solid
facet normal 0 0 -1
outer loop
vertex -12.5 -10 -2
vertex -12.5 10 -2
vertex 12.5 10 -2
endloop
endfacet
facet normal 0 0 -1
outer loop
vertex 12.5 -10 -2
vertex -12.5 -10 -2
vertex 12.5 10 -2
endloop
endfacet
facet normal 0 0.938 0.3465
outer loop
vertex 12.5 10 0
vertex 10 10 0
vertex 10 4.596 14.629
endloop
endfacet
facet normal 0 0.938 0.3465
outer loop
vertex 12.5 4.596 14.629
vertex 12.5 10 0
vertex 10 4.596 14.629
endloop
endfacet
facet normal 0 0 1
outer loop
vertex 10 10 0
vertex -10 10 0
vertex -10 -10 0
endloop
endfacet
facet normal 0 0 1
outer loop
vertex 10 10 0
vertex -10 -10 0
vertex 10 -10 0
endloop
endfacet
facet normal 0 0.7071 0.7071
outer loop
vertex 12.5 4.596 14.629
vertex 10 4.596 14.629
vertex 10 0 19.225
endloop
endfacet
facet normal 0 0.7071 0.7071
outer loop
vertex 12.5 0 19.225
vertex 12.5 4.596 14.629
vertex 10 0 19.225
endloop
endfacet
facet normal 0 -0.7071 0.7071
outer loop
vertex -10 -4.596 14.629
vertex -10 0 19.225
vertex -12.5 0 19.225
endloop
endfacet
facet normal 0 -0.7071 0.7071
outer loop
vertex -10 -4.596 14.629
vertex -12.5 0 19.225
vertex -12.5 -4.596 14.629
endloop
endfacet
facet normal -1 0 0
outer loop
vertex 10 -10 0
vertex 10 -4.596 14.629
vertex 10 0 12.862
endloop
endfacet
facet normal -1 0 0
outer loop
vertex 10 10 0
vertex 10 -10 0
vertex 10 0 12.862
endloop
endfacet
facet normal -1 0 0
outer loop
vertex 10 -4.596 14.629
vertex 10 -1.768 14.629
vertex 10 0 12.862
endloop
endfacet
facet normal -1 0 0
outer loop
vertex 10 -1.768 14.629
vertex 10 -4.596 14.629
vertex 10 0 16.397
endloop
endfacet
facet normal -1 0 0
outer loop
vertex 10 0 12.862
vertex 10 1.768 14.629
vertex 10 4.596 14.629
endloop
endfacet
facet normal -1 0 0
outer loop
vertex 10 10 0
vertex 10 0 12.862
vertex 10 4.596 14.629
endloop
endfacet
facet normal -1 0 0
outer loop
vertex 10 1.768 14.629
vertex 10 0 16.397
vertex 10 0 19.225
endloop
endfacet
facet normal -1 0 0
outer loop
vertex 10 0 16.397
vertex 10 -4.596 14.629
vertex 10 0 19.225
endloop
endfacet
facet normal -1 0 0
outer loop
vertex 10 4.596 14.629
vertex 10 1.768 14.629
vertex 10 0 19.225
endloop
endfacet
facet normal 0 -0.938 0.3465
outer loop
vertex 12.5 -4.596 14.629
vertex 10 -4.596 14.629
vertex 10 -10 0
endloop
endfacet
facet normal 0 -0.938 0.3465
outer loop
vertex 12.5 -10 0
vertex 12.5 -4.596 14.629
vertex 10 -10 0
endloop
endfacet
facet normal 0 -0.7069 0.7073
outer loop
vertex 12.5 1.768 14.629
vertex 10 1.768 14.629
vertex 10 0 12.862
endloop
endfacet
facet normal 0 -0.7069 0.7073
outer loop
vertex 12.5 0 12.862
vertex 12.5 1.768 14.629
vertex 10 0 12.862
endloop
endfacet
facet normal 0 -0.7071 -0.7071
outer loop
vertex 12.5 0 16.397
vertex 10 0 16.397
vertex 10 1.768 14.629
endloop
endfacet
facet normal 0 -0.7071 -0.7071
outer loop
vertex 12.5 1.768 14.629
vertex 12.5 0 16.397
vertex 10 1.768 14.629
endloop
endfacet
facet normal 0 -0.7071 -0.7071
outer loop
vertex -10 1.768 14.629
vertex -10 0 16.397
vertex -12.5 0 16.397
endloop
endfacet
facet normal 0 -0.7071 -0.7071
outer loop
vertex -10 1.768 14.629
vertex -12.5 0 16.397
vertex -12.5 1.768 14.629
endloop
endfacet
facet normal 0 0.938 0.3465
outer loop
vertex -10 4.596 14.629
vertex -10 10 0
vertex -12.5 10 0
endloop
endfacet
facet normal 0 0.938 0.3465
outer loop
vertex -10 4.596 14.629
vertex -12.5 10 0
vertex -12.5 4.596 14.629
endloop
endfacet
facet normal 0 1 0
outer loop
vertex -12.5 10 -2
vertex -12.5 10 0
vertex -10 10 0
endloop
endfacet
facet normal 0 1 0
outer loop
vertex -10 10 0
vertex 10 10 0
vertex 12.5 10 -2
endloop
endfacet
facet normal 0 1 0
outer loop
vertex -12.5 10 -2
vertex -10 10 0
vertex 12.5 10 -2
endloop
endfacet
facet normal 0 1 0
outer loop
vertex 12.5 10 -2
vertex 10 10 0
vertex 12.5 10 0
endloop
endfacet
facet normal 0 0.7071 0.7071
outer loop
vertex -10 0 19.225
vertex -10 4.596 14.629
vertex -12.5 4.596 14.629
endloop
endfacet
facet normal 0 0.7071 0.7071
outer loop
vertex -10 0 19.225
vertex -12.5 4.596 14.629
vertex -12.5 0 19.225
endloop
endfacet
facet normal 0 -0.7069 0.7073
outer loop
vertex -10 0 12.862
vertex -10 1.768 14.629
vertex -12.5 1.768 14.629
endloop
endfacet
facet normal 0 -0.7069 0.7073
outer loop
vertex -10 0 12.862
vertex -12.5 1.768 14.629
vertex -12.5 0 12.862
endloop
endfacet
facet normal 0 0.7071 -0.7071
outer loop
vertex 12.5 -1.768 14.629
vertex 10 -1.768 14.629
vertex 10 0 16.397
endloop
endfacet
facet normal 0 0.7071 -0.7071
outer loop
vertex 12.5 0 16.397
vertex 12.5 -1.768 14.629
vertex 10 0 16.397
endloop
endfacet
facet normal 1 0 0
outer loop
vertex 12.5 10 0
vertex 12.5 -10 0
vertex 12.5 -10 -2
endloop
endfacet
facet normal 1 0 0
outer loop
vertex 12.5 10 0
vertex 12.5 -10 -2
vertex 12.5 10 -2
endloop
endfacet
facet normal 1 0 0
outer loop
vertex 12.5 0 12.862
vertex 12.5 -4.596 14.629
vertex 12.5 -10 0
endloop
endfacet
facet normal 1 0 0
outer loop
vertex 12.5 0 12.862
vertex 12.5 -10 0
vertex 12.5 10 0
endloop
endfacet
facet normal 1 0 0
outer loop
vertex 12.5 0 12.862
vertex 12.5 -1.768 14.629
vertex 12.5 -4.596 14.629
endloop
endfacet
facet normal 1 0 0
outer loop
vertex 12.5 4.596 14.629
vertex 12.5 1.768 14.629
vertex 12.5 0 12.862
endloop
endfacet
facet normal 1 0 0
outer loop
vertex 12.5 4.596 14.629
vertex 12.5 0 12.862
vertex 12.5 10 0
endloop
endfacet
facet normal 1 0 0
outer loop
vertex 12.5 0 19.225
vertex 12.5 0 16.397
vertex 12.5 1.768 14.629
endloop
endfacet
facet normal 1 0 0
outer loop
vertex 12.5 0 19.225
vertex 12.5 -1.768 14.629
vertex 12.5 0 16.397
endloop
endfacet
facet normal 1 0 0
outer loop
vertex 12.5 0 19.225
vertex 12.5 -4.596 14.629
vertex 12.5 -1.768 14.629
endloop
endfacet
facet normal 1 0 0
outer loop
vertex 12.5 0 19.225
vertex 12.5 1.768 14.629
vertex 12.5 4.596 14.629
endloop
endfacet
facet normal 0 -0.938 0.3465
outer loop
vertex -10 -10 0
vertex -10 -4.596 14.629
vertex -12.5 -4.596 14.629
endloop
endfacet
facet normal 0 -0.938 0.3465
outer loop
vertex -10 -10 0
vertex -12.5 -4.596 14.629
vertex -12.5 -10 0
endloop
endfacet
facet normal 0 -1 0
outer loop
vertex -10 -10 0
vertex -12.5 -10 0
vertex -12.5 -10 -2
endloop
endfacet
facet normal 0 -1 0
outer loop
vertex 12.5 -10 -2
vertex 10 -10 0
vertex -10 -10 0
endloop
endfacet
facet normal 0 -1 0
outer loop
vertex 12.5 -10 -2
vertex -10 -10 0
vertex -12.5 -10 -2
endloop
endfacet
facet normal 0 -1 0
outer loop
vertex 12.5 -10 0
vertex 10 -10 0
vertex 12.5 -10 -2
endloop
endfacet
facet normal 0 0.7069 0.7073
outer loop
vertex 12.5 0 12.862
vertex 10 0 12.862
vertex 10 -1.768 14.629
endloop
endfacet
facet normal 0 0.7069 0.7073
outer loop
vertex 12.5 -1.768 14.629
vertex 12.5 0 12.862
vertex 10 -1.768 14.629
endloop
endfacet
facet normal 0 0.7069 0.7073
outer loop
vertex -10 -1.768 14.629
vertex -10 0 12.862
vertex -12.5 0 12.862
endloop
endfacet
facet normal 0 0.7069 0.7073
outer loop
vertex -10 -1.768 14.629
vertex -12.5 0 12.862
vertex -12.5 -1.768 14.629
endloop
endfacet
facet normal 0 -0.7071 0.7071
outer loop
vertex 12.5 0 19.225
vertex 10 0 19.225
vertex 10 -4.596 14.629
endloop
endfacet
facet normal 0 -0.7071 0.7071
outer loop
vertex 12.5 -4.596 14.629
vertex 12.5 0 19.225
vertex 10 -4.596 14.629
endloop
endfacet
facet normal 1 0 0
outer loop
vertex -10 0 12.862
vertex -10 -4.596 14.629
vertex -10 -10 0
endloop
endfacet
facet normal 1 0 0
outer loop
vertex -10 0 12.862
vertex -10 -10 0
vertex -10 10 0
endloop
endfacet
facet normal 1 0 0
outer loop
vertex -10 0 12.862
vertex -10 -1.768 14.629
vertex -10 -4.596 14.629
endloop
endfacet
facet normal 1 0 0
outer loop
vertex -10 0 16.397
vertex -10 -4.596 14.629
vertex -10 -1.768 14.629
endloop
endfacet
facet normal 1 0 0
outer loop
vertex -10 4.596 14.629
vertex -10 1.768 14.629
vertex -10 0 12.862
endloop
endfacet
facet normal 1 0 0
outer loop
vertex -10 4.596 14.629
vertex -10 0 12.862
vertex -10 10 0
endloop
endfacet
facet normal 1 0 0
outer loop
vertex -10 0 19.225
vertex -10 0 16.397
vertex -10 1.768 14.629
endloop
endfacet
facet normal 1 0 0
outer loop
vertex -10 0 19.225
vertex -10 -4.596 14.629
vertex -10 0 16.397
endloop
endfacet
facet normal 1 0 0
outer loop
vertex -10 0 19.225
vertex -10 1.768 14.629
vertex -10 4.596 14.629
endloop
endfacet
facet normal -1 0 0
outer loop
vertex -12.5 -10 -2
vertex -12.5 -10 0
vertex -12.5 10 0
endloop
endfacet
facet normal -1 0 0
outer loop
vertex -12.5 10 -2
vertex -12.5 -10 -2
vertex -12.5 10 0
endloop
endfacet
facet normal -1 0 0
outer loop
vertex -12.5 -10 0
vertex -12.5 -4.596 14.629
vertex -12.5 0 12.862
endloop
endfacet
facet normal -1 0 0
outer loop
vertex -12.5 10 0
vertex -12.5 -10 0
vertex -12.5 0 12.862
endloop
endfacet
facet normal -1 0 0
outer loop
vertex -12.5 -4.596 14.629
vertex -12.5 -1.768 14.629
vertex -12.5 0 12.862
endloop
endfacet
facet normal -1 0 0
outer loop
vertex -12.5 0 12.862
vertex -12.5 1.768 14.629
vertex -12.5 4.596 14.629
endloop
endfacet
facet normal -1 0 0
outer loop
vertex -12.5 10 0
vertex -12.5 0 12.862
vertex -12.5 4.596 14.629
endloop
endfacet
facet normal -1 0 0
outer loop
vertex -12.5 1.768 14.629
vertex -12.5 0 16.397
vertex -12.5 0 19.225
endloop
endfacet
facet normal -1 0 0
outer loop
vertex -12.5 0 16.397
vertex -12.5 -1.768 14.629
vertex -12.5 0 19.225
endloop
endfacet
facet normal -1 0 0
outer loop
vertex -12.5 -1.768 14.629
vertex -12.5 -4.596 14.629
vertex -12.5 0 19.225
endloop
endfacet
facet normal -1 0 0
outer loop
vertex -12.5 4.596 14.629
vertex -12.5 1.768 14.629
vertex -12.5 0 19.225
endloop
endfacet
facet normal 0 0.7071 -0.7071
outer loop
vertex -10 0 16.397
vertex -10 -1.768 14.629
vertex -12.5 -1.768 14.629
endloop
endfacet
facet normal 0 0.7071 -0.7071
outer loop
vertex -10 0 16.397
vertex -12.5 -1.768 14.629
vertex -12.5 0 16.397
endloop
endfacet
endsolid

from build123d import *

# Parameters (mm, degrees)
F2_DEPTH = 2.5
F3_W     = 25
F3_H     = 20
F4_DEPTH = 2


# Not quite as in the source:
# - a pattern or mirror of a feature is missing from the dataset's text; its kind, count and spacing are read off the source's solid


with BuildPart() as f2:
    # F1 (on offset) → F2 (new body)
    with BuildSketch(Plane.YZ.offset(10)):
        Polygon((-4.5961940777, 14.6293006837), (-10, 0), (10, 0), (4.5961940777, 14.6293006837), (0, 19.2254947614), align=None)
        Polygon((0, 16.3970676367), (1.767766953, 14.6293006837), (0, 12.8615337308), (-1.767766953, 14.6293006837), align=None, mode=Mode.SUBTRACT)
    extrude(amount=F2_DEPTH)


with BuildPart() as f2_copies_1:
    # F2_copies: instance of F2
    add(f2.part.mirror(Plane(origin=(0, 0, 0), x_dir=(0, 0, -1), z_dir=(-1, 0, 0))))


with BuildPart() as f2_1:
    add(f2.part)

    add(f2_copies_1.part)  # F4 merges F2_copies_1
    # F3 (on Top) → F4 (join)
    with BuildSketch(Plane.XY):
        Rectangle(F3_W, F3_H)
    extrude(amount=-F4_DEPTH)


solid = f2_1.part
